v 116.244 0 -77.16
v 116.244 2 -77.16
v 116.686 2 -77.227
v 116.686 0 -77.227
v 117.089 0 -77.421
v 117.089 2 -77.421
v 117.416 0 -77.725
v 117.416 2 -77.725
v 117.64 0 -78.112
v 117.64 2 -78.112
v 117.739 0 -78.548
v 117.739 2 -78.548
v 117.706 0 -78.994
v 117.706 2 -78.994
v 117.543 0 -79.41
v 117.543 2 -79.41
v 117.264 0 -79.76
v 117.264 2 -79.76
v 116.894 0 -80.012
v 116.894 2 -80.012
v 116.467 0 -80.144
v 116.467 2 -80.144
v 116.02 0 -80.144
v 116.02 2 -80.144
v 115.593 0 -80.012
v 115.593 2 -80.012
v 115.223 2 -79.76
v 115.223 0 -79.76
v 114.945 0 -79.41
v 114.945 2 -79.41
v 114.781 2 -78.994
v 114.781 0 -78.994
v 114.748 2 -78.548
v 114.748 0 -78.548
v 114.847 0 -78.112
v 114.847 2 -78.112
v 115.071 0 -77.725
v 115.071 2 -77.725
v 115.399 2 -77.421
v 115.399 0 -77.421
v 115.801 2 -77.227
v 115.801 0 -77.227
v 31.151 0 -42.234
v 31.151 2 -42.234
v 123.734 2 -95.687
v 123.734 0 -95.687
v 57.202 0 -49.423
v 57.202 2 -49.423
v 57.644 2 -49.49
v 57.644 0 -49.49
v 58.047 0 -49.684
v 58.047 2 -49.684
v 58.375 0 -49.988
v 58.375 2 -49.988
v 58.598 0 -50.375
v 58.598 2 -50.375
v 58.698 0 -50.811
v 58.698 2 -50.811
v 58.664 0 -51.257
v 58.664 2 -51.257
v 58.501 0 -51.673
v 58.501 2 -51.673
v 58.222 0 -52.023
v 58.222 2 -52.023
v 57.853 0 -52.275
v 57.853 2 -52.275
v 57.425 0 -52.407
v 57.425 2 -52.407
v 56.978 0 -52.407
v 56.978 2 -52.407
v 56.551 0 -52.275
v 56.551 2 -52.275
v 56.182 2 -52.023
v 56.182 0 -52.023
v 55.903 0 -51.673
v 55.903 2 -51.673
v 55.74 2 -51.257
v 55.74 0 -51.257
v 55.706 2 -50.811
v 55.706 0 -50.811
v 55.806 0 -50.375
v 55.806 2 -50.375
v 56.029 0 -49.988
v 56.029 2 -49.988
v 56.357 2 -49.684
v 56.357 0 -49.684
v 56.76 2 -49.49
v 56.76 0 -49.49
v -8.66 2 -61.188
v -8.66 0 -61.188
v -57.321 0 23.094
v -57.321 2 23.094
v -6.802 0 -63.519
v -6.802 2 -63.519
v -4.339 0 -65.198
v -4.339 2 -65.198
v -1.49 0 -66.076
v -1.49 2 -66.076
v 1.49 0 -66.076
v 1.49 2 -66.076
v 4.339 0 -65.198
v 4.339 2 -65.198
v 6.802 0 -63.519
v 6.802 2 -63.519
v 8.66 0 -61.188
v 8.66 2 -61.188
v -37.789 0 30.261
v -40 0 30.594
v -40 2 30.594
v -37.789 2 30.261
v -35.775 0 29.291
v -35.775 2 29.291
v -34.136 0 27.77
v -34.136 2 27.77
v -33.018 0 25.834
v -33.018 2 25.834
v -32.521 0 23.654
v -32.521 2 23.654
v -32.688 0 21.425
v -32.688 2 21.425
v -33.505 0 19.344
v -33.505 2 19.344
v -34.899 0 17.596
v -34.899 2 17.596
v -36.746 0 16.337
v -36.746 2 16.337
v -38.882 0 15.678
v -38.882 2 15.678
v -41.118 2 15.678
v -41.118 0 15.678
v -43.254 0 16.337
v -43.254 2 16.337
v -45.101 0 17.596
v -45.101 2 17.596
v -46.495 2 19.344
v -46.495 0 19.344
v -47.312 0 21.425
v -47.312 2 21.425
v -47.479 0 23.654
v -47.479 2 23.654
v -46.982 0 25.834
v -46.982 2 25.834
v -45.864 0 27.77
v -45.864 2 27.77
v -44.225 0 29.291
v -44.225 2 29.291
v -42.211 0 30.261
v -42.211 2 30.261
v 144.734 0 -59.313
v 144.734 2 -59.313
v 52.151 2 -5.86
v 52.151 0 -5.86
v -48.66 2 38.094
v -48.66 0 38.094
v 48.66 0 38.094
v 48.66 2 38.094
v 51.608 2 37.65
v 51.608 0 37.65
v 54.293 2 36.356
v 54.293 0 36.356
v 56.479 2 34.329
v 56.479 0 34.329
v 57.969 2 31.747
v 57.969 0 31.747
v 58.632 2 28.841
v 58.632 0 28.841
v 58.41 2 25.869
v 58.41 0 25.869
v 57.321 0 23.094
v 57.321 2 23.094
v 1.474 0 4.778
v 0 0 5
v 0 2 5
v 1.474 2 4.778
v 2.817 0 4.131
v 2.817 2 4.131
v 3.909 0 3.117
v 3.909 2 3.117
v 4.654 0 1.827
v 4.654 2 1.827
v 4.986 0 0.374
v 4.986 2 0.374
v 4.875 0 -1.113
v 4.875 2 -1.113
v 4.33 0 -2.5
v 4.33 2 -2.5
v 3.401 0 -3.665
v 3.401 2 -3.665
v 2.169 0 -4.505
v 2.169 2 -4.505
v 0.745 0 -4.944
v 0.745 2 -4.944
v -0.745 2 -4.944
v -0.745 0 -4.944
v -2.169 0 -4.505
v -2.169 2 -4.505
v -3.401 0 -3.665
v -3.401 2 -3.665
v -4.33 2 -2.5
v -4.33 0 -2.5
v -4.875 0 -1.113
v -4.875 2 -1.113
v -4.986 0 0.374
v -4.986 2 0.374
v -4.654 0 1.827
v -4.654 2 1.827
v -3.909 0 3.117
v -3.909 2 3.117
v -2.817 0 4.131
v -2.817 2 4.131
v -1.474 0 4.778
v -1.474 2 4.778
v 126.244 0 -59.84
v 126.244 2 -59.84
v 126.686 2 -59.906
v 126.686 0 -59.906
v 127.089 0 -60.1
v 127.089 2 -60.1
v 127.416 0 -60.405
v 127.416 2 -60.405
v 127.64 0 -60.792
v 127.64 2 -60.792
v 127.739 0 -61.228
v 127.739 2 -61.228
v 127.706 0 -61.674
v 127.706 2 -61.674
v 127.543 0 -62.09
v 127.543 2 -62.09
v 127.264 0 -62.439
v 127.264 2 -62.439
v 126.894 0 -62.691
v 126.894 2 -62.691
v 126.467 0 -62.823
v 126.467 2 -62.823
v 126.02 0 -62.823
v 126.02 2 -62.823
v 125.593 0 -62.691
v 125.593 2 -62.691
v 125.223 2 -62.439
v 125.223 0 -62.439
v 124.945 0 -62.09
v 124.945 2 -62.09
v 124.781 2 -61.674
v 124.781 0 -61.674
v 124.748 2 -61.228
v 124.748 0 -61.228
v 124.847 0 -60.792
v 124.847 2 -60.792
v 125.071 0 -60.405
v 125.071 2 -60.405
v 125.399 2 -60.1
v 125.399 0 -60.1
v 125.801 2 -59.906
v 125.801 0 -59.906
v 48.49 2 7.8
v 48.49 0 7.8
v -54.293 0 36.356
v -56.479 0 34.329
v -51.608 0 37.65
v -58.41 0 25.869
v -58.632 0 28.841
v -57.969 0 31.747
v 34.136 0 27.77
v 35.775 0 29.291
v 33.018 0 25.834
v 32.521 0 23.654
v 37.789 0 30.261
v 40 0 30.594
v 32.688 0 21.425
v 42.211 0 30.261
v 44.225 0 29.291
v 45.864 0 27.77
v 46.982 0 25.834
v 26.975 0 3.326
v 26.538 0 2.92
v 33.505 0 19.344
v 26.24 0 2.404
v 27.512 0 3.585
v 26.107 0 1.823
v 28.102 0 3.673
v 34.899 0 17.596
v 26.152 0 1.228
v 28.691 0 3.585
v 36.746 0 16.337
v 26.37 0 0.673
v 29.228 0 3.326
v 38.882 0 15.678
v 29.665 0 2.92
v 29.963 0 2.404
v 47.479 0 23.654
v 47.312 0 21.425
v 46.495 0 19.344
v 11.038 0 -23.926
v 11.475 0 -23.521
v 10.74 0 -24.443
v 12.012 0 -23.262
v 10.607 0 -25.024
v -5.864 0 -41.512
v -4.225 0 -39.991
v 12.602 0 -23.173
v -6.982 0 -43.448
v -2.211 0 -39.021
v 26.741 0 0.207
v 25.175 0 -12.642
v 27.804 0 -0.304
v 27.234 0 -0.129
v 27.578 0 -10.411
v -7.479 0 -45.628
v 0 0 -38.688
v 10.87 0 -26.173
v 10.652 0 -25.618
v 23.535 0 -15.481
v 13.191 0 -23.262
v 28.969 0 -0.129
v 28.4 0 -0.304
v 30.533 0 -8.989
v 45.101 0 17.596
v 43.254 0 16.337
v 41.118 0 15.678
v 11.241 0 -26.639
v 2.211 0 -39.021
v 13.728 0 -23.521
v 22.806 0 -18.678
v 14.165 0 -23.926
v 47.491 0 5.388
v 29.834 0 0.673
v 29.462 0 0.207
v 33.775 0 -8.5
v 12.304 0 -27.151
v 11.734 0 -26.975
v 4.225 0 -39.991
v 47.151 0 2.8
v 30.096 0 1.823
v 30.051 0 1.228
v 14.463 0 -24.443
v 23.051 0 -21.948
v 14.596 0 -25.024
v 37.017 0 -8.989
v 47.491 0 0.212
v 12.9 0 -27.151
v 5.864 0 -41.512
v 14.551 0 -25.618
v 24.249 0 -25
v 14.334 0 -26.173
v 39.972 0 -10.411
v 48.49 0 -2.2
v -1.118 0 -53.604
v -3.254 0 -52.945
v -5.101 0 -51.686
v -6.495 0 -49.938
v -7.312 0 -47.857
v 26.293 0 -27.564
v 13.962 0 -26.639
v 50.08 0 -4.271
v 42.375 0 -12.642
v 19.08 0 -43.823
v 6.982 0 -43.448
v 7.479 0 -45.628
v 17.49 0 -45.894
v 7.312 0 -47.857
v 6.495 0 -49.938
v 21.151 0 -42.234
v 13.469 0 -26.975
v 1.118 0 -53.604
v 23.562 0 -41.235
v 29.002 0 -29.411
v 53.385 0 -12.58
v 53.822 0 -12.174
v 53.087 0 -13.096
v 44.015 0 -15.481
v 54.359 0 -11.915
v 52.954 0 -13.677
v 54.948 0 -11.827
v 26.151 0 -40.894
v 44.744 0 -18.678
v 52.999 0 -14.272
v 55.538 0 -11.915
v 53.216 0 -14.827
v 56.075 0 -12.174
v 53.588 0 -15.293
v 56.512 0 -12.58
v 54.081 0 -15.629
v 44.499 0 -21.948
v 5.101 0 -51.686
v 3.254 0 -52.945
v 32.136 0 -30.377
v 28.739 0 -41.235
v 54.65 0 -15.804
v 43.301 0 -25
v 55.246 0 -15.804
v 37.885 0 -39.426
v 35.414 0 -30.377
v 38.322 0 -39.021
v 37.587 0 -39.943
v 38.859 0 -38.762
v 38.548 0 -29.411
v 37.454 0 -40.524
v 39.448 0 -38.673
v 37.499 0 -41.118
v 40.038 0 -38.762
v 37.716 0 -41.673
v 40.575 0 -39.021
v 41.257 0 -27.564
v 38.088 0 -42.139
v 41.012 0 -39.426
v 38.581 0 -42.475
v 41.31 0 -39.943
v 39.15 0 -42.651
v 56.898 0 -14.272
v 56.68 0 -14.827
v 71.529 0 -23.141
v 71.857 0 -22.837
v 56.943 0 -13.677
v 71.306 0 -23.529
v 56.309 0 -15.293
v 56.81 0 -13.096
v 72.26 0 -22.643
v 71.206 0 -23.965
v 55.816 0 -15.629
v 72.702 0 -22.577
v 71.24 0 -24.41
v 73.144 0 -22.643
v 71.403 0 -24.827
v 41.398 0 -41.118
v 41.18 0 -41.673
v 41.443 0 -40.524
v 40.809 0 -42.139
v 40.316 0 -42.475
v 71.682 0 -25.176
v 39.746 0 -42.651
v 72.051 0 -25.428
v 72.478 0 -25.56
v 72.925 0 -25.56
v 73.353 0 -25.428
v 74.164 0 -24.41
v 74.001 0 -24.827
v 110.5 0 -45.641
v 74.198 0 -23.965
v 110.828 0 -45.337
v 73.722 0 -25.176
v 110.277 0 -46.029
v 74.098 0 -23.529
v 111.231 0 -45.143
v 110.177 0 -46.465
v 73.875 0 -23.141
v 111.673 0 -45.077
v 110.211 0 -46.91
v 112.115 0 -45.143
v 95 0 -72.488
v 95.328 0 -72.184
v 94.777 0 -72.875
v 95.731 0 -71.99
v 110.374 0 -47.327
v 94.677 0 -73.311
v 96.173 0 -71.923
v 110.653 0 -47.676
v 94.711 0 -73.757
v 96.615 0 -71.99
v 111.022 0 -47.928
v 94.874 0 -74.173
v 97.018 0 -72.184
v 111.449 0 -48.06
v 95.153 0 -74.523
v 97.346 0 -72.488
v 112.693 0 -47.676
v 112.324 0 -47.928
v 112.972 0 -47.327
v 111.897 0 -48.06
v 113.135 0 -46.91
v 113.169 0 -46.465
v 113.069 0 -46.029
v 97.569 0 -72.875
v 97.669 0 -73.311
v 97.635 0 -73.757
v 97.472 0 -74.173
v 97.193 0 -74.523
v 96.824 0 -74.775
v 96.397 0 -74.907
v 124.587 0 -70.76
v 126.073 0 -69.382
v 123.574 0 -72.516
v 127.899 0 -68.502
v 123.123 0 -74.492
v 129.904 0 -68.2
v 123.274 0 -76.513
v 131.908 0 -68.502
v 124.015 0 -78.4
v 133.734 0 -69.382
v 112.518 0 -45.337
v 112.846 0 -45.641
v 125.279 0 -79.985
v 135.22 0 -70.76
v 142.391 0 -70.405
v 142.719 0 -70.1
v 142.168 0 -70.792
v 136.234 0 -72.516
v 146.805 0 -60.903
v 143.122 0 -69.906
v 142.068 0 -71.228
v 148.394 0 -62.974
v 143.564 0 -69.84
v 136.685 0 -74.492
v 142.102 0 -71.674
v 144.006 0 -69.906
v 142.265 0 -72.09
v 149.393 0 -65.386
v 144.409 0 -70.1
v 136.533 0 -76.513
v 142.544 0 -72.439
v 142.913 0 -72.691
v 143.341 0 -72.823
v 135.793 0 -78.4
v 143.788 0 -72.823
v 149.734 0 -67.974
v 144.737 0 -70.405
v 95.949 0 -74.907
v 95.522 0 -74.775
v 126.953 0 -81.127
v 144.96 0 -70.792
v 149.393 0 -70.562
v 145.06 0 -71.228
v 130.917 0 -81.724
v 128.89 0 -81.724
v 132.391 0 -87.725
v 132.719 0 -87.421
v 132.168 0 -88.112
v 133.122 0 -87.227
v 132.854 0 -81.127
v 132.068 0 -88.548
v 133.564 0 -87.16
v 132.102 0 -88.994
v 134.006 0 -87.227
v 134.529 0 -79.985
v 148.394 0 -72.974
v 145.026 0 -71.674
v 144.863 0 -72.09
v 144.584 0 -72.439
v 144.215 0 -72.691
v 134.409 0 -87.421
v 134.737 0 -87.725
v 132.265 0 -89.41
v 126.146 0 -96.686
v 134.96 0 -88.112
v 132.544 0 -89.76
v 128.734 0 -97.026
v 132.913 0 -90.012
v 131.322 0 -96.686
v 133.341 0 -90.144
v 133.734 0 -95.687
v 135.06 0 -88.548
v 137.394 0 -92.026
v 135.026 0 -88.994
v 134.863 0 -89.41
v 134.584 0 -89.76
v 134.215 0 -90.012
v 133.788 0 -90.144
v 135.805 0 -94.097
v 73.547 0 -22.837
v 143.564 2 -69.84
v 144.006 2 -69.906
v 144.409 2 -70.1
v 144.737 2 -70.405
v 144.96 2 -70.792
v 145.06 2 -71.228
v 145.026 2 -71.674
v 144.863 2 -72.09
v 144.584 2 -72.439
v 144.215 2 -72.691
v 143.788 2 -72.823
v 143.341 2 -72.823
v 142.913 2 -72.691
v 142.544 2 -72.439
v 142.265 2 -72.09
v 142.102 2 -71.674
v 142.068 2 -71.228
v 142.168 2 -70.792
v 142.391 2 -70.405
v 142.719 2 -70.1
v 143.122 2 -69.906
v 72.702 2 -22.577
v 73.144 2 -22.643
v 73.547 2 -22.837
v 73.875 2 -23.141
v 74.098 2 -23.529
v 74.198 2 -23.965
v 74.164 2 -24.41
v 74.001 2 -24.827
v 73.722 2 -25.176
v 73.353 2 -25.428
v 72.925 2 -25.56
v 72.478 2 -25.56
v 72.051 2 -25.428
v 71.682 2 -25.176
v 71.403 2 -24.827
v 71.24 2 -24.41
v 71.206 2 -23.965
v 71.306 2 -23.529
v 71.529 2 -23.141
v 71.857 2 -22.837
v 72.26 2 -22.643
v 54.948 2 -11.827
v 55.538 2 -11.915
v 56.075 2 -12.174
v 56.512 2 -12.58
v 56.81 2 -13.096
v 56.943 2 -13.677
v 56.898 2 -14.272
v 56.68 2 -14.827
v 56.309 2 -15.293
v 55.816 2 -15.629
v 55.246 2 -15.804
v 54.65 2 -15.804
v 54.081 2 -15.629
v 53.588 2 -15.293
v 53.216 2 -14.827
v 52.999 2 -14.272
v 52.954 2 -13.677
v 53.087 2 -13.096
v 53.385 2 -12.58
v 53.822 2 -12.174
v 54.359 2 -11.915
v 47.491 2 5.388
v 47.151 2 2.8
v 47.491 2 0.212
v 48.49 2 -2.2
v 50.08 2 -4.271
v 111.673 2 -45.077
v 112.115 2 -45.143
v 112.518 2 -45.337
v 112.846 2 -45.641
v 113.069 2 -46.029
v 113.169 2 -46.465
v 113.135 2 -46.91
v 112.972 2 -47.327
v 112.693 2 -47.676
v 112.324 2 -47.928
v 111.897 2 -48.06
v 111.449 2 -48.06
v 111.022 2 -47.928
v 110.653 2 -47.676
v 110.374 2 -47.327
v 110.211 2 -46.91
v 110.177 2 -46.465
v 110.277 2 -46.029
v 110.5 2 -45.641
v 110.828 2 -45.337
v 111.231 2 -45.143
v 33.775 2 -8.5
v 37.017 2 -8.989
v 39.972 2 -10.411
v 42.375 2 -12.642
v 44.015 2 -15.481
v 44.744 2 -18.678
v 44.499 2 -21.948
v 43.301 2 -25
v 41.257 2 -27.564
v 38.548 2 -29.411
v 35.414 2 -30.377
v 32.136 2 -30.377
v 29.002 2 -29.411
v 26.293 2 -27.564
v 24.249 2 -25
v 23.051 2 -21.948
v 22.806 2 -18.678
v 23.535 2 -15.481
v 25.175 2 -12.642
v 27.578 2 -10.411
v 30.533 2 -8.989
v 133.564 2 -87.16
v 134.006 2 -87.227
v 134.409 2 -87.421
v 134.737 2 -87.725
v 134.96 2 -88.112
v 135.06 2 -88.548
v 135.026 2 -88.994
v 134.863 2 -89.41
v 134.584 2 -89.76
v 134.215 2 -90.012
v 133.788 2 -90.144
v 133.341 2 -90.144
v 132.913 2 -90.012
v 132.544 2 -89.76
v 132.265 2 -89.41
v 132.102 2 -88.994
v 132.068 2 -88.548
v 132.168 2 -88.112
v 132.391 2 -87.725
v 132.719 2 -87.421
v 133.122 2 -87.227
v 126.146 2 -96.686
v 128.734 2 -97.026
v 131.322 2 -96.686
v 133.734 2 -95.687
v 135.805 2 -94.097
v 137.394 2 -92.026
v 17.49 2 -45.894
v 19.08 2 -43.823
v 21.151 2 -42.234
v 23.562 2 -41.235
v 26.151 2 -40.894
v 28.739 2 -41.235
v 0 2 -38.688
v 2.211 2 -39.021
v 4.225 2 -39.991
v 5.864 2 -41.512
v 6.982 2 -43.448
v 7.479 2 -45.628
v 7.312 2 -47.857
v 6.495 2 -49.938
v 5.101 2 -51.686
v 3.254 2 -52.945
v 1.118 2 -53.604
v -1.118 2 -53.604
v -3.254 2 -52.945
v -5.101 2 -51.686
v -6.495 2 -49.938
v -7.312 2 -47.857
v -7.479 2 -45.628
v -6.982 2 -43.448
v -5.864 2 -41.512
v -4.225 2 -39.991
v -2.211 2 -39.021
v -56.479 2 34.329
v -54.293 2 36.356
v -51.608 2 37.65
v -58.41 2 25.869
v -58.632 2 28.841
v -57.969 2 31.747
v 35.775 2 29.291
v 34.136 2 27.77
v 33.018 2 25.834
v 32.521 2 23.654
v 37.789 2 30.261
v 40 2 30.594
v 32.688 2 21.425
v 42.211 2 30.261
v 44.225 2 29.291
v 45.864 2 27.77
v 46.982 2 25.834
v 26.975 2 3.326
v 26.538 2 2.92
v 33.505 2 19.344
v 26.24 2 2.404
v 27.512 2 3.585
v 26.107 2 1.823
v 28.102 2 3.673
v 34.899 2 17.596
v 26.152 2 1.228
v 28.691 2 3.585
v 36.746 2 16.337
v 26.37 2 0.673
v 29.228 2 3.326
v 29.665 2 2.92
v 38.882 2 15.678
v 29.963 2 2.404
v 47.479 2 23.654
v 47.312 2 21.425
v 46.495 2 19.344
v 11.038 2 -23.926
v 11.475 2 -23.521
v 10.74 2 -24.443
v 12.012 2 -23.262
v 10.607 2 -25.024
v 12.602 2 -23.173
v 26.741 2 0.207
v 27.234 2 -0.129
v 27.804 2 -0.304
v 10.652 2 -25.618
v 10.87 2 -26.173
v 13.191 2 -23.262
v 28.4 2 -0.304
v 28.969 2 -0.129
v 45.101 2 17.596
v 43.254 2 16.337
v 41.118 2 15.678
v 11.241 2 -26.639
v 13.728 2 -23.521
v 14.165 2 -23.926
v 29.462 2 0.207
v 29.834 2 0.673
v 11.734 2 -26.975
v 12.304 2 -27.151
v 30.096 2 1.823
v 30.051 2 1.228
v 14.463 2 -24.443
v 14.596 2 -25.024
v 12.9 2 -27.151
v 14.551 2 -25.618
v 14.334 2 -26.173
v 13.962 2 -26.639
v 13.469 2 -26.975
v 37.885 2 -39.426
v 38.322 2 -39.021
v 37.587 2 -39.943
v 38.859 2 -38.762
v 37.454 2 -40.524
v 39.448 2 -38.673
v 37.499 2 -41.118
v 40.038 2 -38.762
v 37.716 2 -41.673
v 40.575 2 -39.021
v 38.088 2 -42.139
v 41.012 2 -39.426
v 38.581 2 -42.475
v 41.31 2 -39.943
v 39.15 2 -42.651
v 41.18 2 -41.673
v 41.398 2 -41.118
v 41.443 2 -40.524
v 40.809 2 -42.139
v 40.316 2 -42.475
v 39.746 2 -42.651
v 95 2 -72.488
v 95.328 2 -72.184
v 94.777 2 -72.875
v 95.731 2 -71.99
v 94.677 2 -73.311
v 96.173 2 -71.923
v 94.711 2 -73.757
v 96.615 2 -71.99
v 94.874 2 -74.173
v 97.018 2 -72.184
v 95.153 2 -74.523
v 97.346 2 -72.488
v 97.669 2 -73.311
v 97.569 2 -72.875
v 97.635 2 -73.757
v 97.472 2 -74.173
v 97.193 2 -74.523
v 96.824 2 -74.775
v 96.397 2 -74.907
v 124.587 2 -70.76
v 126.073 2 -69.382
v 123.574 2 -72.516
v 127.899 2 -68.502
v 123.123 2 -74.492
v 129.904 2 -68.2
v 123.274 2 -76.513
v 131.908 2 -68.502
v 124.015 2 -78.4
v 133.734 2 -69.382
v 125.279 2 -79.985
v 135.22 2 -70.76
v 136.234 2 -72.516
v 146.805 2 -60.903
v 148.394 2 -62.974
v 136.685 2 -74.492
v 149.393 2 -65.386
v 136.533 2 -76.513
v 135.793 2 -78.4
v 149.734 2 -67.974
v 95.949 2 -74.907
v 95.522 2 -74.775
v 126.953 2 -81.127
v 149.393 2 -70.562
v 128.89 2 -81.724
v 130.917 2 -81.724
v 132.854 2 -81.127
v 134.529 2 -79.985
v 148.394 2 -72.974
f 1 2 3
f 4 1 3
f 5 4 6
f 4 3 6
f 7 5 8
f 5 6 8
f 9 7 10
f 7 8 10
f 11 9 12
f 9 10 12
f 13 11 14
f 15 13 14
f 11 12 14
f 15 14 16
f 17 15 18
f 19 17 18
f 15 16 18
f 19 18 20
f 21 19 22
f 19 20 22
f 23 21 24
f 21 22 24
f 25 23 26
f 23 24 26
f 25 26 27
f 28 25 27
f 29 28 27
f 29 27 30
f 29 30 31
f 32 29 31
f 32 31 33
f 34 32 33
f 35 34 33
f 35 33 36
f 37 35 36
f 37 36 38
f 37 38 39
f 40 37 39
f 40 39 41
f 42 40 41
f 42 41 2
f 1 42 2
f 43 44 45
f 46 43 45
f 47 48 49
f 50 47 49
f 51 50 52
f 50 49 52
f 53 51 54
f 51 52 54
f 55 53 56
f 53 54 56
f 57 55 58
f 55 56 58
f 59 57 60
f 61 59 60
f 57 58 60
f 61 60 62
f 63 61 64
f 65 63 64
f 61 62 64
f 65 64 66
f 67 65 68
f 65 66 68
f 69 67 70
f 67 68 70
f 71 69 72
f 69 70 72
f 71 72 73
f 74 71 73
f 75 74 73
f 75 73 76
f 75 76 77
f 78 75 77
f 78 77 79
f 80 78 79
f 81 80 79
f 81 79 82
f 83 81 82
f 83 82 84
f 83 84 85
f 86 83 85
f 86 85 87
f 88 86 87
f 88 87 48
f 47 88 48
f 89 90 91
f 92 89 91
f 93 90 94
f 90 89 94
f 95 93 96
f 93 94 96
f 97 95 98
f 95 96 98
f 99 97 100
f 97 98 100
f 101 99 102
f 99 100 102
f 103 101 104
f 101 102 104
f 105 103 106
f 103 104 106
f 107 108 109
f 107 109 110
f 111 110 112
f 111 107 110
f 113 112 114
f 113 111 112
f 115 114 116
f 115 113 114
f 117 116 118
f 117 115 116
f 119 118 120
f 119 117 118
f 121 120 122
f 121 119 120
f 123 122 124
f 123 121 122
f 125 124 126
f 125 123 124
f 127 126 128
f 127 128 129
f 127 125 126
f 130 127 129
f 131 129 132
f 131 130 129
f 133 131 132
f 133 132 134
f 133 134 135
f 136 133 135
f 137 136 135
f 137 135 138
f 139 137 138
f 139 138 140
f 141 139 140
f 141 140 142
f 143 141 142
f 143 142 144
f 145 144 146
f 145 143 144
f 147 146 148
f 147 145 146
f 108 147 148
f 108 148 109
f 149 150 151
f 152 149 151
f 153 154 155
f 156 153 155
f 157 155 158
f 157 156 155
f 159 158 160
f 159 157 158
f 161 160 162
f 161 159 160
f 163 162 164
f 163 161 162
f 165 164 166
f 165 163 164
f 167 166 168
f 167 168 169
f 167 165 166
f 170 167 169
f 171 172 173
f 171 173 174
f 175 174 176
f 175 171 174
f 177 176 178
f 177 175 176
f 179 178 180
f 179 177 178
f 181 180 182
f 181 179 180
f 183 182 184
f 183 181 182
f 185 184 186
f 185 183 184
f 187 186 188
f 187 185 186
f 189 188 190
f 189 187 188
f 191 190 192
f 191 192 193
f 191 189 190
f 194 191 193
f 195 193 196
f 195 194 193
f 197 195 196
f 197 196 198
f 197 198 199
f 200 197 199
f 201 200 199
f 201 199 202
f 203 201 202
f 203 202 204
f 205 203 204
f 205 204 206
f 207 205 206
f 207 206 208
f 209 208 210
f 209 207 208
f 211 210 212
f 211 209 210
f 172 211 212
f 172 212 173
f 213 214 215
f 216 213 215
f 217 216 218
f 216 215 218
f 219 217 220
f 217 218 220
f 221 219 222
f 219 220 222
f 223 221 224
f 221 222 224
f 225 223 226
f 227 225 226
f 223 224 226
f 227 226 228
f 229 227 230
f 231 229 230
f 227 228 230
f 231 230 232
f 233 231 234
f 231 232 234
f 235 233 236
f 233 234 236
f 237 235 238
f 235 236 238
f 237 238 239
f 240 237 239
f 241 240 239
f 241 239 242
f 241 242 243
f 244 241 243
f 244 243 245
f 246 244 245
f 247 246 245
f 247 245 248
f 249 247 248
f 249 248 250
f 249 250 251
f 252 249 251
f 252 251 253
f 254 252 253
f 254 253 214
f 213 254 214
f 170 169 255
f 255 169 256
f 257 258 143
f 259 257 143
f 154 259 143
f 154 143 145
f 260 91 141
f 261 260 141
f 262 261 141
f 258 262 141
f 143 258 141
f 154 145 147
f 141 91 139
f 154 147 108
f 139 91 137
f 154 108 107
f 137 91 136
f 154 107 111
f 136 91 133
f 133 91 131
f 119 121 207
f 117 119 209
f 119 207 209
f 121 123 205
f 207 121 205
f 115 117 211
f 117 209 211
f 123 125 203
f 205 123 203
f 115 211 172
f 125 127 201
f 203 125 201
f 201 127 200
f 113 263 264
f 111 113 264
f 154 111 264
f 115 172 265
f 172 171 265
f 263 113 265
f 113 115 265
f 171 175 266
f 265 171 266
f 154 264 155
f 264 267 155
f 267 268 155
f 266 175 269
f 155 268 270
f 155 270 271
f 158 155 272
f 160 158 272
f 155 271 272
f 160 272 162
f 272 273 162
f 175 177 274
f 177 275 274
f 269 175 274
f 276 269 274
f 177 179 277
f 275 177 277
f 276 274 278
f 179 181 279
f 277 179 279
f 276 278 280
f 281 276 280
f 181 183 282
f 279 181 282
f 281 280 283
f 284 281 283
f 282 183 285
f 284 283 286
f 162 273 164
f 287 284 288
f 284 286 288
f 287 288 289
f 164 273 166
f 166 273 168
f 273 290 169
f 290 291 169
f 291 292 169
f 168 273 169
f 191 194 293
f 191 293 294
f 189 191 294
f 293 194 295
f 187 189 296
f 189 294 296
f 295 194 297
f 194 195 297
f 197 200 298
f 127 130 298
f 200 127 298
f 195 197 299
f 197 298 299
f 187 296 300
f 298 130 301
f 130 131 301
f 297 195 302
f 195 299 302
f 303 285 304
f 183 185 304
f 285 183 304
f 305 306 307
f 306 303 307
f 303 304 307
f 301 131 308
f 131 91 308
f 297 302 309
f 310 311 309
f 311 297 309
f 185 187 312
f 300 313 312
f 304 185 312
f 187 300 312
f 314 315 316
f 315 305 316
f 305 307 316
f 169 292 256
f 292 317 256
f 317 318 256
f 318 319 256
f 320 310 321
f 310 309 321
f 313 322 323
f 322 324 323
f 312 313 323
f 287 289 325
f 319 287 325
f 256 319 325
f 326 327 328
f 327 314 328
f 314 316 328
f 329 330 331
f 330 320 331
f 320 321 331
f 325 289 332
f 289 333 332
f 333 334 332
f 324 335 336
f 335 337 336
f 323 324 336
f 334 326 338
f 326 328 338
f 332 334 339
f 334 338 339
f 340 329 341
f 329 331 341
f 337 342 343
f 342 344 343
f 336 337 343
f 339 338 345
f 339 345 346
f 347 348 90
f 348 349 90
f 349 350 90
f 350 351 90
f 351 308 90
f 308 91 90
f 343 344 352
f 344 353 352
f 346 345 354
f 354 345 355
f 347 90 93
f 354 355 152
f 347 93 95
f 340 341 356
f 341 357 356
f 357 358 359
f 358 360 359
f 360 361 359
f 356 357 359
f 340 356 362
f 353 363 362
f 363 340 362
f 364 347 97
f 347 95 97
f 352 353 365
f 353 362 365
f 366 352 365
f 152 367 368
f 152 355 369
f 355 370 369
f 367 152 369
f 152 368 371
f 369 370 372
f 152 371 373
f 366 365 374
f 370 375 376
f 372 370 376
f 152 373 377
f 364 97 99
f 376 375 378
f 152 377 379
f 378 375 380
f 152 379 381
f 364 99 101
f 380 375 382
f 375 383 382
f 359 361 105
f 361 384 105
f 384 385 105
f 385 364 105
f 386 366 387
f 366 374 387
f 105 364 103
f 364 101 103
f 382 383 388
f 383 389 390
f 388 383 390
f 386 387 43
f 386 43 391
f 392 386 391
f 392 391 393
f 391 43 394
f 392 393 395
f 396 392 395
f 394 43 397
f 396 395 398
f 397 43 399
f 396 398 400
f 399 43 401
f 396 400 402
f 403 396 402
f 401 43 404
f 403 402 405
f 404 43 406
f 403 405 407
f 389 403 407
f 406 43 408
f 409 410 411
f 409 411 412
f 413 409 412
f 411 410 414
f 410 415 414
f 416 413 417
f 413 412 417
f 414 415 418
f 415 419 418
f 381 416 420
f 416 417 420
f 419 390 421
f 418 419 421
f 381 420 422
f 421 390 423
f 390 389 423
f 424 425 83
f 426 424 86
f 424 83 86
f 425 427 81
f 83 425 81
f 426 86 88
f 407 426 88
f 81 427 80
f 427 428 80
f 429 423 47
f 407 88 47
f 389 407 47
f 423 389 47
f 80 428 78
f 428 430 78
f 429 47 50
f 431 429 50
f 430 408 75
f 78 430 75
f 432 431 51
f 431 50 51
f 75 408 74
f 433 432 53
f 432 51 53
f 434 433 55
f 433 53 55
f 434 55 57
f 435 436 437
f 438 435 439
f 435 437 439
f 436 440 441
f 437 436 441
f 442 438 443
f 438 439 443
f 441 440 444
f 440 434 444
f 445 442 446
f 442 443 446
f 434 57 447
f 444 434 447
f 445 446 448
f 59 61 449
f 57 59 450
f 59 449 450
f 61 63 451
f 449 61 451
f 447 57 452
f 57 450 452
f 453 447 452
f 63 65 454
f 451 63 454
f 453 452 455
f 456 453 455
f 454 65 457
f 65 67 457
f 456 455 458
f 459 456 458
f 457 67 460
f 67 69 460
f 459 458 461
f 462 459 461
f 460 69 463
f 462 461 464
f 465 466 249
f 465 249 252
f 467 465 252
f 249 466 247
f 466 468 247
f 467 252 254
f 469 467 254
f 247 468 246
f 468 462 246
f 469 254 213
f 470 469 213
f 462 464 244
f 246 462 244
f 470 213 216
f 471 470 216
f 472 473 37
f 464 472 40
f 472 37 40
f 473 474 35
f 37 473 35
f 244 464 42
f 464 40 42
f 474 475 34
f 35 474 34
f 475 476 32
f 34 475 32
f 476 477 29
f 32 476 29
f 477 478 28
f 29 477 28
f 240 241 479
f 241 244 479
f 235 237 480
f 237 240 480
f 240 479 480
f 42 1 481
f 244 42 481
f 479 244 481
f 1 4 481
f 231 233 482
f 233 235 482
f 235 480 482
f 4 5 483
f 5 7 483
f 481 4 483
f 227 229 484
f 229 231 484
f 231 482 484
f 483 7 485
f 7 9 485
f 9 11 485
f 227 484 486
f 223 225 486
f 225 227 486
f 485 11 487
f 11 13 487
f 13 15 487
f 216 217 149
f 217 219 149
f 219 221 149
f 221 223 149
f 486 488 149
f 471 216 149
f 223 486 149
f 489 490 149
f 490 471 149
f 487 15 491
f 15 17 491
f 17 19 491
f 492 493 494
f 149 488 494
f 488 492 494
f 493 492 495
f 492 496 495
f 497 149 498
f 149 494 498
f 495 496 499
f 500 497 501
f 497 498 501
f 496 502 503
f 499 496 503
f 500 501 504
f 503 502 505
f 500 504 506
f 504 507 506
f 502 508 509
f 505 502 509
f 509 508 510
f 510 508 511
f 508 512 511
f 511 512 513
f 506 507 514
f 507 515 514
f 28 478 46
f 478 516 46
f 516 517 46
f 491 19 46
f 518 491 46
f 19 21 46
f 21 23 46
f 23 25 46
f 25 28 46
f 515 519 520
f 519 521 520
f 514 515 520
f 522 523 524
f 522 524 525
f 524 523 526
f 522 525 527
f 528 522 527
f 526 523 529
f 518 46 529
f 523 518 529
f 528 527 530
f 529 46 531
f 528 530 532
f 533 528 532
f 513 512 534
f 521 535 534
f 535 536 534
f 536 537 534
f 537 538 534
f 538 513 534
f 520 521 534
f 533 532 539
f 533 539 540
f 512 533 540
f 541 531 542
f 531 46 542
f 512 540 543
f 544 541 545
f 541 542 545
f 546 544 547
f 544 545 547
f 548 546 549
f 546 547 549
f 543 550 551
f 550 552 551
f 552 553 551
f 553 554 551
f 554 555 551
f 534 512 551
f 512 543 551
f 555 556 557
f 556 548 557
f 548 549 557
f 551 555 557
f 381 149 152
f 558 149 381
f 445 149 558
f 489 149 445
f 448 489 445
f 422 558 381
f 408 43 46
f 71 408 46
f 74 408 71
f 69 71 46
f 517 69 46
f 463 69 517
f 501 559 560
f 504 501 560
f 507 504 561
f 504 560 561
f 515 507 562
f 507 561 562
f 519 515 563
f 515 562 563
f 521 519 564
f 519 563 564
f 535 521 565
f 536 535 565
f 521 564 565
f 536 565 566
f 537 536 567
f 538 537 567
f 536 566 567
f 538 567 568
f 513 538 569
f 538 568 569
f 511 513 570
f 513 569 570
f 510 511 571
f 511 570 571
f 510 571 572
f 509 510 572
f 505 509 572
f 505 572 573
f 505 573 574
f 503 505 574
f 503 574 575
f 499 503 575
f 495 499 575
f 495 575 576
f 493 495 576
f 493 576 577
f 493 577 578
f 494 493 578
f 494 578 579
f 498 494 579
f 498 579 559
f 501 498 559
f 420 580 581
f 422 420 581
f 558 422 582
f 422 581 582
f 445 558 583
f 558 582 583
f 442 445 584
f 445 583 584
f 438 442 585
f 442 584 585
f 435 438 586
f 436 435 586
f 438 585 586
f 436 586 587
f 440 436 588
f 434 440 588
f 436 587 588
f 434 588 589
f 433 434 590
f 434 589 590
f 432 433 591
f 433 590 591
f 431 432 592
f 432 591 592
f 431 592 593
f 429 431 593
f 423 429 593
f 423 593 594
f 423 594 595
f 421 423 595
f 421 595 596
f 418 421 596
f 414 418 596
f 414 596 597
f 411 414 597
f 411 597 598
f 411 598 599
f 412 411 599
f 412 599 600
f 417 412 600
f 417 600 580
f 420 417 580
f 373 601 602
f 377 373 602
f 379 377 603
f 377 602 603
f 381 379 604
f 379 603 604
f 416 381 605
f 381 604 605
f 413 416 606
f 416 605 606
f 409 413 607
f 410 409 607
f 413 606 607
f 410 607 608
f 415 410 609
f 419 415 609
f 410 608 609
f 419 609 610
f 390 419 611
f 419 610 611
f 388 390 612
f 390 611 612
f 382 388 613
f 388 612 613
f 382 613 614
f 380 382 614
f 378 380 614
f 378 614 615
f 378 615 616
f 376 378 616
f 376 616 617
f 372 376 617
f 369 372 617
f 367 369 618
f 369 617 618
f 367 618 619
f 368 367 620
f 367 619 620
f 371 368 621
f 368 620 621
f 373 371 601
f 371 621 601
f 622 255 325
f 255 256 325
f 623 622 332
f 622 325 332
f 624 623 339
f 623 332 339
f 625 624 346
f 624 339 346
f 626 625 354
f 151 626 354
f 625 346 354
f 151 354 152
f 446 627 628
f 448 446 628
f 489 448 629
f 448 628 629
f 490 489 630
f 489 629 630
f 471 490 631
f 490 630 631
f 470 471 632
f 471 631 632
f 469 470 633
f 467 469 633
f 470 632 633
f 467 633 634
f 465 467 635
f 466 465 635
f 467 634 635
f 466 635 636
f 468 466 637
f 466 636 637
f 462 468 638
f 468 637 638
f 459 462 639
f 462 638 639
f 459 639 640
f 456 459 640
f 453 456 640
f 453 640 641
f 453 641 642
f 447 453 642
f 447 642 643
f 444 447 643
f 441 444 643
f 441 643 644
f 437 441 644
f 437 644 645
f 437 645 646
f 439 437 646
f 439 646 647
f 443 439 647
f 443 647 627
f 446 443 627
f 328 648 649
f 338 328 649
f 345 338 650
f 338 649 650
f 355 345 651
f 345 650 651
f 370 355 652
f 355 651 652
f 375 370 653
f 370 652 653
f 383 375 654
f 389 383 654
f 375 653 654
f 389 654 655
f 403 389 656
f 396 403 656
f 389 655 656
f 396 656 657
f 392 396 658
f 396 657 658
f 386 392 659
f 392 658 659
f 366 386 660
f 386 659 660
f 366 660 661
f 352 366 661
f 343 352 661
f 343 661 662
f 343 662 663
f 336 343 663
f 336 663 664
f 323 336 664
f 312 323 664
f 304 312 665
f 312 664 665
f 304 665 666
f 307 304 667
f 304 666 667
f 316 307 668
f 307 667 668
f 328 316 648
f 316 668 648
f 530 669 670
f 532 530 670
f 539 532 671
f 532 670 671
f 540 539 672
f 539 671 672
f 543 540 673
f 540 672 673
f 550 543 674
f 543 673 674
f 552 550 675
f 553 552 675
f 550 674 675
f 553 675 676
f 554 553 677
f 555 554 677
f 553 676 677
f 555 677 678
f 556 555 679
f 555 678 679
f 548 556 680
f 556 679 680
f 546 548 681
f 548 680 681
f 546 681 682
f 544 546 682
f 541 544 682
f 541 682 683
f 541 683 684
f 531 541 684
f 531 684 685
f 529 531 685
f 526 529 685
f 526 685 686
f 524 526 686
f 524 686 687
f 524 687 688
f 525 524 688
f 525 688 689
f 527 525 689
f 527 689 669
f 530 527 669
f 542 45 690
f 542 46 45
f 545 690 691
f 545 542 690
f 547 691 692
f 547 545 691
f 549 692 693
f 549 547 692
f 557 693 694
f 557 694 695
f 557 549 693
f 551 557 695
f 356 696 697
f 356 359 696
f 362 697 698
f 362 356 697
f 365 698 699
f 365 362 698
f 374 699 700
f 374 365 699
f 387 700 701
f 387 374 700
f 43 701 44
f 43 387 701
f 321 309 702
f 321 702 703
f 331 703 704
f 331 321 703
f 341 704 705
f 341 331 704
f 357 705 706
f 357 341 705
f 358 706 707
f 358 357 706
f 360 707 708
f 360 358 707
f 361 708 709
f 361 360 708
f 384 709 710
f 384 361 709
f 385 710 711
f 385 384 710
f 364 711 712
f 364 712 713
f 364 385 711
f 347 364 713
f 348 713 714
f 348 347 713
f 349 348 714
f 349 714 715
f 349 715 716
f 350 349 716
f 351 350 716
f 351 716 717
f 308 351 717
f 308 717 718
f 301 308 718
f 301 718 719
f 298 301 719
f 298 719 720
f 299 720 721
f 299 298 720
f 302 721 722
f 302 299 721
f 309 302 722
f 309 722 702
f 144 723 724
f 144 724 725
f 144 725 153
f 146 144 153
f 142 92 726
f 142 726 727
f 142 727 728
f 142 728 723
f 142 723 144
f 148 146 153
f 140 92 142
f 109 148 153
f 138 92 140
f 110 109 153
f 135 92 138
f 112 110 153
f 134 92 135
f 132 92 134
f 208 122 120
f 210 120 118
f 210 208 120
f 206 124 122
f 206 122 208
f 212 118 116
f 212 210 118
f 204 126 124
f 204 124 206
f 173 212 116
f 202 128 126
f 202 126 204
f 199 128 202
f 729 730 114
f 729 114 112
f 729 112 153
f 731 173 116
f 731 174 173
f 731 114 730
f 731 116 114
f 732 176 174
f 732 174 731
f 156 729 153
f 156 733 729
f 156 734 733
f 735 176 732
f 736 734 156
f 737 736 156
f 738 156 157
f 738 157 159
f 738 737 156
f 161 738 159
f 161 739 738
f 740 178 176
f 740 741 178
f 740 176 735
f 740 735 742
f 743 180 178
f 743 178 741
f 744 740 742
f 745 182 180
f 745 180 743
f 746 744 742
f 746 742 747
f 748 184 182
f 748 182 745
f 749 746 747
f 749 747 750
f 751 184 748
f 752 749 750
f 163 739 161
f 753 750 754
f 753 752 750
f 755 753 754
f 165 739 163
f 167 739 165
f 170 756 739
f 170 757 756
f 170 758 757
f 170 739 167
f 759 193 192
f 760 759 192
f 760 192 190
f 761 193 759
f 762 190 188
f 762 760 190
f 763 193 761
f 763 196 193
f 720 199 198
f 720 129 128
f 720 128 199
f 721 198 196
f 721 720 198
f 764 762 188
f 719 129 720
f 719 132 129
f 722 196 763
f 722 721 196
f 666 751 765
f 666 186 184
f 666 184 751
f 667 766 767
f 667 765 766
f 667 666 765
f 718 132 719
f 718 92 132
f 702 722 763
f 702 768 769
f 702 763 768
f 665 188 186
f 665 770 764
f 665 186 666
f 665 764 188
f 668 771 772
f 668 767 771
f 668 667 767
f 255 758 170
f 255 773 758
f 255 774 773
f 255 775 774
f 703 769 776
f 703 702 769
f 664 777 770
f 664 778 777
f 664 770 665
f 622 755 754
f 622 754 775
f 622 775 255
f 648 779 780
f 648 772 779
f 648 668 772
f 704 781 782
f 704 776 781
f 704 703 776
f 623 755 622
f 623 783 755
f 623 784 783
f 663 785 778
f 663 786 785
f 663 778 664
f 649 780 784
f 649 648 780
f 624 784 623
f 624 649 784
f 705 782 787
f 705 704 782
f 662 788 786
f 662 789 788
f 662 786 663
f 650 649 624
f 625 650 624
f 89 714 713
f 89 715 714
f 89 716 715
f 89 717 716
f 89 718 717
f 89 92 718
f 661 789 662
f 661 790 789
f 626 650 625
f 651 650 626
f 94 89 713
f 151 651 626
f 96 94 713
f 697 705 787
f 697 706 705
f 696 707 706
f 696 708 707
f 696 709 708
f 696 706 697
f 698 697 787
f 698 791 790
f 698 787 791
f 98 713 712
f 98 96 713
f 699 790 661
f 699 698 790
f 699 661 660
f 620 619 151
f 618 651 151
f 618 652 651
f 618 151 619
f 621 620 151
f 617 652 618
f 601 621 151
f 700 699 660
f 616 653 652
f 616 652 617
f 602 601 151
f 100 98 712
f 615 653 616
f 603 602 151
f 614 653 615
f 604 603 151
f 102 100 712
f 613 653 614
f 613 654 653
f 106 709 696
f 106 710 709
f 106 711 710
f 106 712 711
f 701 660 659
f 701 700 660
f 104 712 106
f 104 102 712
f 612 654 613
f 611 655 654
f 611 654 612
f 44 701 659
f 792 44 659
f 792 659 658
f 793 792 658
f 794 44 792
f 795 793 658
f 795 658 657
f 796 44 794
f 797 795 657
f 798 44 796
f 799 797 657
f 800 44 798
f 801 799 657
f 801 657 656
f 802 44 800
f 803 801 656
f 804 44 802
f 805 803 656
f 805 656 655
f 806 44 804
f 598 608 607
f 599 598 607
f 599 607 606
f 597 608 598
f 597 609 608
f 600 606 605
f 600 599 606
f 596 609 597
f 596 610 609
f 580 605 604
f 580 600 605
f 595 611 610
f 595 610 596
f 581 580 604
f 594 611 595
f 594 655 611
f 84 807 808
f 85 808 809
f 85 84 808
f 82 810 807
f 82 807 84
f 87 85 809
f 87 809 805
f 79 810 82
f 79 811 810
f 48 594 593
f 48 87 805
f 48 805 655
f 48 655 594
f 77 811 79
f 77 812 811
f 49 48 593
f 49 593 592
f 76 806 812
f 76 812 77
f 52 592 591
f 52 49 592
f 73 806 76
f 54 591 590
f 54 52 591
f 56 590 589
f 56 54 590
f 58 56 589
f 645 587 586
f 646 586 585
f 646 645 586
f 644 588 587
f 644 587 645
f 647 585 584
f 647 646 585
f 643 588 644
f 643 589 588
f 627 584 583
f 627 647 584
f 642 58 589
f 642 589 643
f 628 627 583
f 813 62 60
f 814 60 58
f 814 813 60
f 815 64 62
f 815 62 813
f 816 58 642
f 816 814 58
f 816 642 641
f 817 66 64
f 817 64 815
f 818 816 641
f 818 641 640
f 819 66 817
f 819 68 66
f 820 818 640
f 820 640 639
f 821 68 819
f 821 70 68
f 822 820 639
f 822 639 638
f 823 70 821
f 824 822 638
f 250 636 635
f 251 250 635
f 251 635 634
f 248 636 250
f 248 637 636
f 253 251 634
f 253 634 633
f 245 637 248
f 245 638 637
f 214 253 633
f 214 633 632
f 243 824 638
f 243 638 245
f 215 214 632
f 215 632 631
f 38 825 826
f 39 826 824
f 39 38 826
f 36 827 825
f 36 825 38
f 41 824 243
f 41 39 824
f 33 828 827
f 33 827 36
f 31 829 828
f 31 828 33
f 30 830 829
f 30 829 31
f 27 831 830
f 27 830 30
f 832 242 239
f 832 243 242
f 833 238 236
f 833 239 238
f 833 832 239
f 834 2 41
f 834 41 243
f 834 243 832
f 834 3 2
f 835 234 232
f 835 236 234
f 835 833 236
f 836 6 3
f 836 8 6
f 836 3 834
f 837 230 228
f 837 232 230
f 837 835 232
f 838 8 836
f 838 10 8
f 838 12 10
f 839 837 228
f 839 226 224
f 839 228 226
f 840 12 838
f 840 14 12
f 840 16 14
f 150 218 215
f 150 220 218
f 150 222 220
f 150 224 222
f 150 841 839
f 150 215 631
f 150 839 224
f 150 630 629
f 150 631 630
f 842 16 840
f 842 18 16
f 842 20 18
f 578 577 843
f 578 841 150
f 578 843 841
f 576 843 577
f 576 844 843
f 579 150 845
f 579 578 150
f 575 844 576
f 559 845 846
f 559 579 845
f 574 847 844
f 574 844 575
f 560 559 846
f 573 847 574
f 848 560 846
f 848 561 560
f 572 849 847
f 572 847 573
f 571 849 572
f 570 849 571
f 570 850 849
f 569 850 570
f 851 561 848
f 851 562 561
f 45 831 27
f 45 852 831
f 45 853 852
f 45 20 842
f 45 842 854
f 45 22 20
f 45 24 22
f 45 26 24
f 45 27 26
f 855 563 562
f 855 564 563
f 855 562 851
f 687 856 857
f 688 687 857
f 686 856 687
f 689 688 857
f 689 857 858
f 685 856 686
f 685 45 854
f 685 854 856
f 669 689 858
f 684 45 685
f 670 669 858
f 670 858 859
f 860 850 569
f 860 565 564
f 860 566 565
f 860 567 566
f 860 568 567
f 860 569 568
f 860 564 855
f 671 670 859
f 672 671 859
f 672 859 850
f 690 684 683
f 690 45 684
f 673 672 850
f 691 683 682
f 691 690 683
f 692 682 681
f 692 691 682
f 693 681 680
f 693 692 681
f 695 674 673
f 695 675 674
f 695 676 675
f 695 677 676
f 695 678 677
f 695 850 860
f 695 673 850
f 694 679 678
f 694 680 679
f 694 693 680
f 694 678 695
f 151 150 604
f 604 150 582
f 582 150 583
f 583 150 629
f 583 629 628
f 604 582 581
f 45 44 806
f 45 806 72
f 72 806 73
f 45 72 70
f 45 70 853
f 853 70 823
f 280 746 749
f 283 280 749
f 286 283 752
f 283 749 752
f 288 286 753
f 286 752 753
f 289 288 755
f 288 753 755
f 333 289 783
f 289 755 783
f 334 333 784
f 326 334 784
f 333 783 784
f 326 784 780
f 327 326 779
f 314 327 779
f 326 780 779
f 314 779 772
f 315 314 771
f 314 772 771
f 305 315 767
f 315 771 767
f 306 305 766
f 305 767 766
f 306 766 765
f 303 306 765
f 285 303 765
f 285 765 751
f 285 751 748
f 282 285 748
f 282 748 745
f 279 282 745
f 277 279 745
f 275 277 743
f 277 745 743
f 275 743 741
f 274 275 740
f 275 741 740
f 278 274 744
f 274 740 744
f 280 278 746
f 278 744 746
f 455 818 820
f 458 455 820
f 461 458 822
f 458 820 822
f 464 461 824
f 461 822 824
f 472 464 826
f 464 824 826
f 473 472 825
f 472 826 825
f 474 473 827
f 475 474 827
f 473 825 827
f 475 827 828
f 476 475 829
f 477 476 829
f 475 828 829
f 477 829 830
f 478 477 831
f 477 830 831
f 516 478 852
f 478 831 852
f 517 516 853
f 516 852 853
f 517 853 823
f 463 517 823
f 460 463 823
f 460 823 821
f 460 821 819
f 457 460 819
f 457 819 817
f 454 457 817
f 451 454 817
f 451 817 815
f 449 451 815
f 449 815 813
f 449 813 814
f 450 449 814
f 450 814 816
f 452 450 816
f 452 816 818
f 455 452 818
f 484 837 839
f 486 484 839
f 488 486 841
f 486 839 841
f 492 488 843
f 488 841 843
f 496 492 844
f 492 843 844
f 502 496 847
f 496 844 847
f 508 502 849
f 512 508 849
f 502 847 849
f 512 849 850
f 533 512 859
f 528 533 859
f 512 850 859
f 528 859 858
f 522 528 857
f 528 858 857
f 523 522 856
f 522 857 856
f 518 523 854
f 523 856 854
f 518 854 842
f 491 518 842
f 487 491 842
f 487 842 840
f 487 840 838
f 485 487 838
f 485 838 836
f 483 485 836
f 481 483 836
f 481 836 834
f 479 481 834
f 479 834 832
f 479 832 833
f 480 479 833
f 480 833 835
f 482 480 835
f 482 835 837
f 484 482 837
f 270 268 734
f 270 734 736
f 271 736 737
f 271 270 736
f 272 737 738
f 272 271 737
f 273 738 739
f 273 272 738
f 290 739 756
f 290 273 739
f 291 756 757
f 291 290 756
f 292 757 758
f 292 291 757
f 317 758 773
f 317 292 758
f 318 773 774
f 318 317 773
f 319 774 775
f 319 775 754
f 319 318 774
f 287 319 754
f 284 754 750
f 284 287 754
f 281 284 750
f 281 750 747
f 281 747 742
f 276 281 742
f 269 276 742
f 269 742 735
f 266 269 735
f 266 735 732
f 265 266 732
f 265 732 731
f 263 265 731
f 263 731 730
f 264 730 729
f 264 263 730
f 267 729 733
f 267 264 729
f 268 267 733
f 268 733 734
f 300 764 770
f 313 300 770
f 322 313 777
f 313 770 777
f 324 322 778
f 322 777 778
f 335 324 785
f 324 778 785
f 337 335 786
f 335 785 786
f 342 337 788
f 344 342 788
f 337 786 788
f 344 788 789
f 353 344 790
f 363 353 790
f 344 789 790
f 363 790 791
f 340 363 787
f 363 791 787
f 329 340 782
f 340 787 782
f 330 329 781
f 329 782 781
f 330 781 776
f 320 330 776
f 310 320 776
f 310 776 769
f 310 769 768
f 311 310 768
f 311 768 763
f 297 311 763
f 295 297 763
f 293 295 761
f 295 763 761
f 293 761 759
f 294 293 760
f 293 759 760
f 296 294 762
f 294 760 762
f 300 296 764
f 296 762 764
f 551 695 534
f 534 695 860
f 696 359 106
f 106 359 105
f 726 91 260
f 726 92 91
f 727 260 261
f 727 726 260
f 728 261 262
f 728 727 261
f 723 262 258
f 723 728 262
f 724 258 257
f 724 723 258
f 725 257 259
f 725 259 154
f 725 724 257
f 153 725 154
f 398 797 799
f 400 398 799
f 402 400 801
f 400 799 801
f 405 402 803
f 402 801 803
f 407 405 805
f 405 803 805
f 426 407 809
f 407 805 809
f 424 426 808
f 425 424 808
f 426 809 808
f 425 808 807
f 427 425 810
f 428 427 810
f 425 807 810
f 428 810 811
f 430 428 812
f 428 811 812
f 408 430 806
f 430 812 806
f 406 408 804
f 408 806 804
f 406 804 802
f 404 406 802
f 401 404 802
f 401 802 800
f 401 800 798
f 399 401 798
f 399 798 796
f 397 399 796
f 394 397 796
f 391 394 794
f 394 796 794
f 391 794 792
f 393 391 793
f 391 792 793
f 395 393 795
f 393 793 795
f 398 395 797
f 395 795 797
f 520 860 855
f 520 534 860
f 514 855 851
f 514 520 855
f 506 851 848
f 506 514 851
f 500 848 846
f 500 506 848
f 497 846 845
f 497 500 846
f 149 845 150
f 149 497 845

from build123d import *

# Parameters (mm, degrees)
SKETCH1_R           = 7.5
SKETCH1_R_2         = 5
BOSS_EXTRUDE1_DEPTH = 2
BOSS_EXTRUDE2_DEPTH = 2
FILLET1_R           = 10
SKETCH4_R           = 11
SKETCH4_R_2         = 2
CUT_EXTRUDE1_DEPTH  = 2
SKETCH6_R           = 6.8
CUT_EXTRUDE2_DEPTH  = 10
SKETCH8_R           = 1.5
CUT_EXTRUDE3_DEPTH  = 179.433043373
SKETCH9_R           = 1.5
CUT_EXTRUDE4_DEPTH  = 10


with BuildPart() as part:
    # Sketch1 → Boss-Extrude1 (new body)
    with BuildSketch(Plane(origin=(0, 0, 0), x_dir=(1, 0, 0), z_dir=(0, 1, 0))):
        Polygon((0, 76.188021535), (-65.980762114, -38.094010768), (65.980762114, -38.094010768), align=None)
        with Locations(Location((0, 46.188021535, 0), (0, 0, 270))):
            Circle(SKETCH1_R, mode=Mode.SUBTRACT)
        with Locations(Location((-40, -23.094010768, 0), (0, 0, 270))):
            Circle(SKETCH1_R, mode=Mode.SUBTRACT)
        with Locations(Location((40, -23.094010768, 0), (0, 0, 270))):
            Circle(SKETCH1_R, mode=Mode.SUBTRACT)
        with Locations(Location((0, 0, 0), (0, 0, 270))):
            Circle(SKETCH1_R_2, mode=Mode.SUBTRACT)
    extrude(amount=BOSS_EXTRUDE1_DEPTH)

    # Sketch2 → Boss-Extrude2 (add)
    with BuildSketch(Plane(origin=(0, 2, 0), x_dir=(1, 0, 0), z_dir=(0, 1, 0))):
        Polygon((43.490381057, 0.860471904), (22.490381057, 37.233538863), (132.394191624, 100.686533479), (153.394191624, 64.313466521), align=None)
    extrude(amount=-BOSS_EXTRUDE2_DEPTH)

    # Fillet1
    fillet1_edges = [part.edges().sort_by_distance(p)[0] for p in [
        (153.394191624, 1, -64.313466521),
        (43.490381057, 1, -0.860471904),
        (22.490381057, 1, -37.233538863),
        (132.394191624, 1, -100.686533479),
        (65.980762114, 1, 38.094010768),
        (-65.980762114, 1, 38.094010768),
        (0, 1, -76.188021535),
    ]]
    fillet(fillet1_edges, radius=FILLET1_R)

    # Sketch4 → Cut-Extrude1 (cut)
    with BuildSketch(Plane(origin=(0, 2, 0), x_dir=(1, 0, 0), z_dir=(0, 1, 0))):
        with Locations(Location((33.774990748, 19.5, 0), (0, 0, 270))):
            Circle(SKETCH4_R)
        with Locations(Location((39.448384506, 40.673393759, 0), (0, 0, 270))):
            Circle(SKETCH4_R_2)
        with Locations(Location((54.948384506, 13.826606241, 0), (0, 0, 270))):
            Circle(SKETCH4_R_2)
        with Locations(Location((28.101596989, -1.673393759, 0), (0, 0, 270))):
            Circle(SKETCH4_R_2)
        with Locations(Location((12.601596989, 25.173393759, 0), (0, 0, 270))):
            Circle(SKETCH4_R_2)
    extrude(amount=-CUT_EXTRUDE1_DEPTH, mode=Mode.SUBTRACT)

    # Sketch6 → Cut-Extrude2 (cut)
    with BuildSketch(Plane(origin=(0, 2, 0), x_dir=(1, 0, 0), z_dir=(0, 1, 0))):
        with Locations(Location((129.903810568, 75, 0), (0, 0, 270))):
            Circle(SKETCH6_R)
    extrude(amount=-CUT_EXTRUDE2_DEPTH, mode=Mode.SUBTRACT)

    # Sketch8 → Cut-Extrude3 (cut, through all)
    with BuildSketch(Plane(origin=(0, 2, 0), x_dir=(1, 0, 0), z_dir=(0, 1, 0))):
        with Locations(Location((133.564064606, 88.660254038, 0), (0, 0, 270))):
            Circle(SKETCH8_R)
        with Locations(Location((143.564064606, 71.339745962, 0), (0, 0, 270))):
            Circle(SKETCH8_R)
        with Locations(Location((126.24355653, 61.339745962, 0), (0, 0, 270))):
            Circle(SKETCH8_R)
        with Locations(Location((116.24355653, 78.660254038, 0), (0, 0, 270))):
            Circle(SKETCH8_R)
    extrude(amount=-CUT_EXTRUDE3_DEPTH, mode=Mode.SUBTRACT)

    # Sketch9 → Cut-Extrude4 (cut)
    with BuildSketch(Plane(origin=(0, 2, 0), x_dir=(1, 0, 0), z_dir=(0, 1, 0))):
        with Locations(Location((57.201905284, 50.923393759, 0), (0, 0, 270))):
            Circle(SKETCH9_R)
        with Locations(Location((72.701905284, 24.076606241, 0), (0, 0, 270))):
            Circle(SKETCH9_R)
        with Locations(Location((111.673048454, 46.576606241, 0), (0, 0, 270))):
            Circle(SKETCH9_R)
        with Locations(Location((96.173048454, 73.423393759, 0), (0, 0, 270))):
            Circle(SKETCH9_R)
    extrude(amount=-CUT_EXTRUDE4_DEPTH, mode=Mode.SUBTRACT)


solid = part.part
